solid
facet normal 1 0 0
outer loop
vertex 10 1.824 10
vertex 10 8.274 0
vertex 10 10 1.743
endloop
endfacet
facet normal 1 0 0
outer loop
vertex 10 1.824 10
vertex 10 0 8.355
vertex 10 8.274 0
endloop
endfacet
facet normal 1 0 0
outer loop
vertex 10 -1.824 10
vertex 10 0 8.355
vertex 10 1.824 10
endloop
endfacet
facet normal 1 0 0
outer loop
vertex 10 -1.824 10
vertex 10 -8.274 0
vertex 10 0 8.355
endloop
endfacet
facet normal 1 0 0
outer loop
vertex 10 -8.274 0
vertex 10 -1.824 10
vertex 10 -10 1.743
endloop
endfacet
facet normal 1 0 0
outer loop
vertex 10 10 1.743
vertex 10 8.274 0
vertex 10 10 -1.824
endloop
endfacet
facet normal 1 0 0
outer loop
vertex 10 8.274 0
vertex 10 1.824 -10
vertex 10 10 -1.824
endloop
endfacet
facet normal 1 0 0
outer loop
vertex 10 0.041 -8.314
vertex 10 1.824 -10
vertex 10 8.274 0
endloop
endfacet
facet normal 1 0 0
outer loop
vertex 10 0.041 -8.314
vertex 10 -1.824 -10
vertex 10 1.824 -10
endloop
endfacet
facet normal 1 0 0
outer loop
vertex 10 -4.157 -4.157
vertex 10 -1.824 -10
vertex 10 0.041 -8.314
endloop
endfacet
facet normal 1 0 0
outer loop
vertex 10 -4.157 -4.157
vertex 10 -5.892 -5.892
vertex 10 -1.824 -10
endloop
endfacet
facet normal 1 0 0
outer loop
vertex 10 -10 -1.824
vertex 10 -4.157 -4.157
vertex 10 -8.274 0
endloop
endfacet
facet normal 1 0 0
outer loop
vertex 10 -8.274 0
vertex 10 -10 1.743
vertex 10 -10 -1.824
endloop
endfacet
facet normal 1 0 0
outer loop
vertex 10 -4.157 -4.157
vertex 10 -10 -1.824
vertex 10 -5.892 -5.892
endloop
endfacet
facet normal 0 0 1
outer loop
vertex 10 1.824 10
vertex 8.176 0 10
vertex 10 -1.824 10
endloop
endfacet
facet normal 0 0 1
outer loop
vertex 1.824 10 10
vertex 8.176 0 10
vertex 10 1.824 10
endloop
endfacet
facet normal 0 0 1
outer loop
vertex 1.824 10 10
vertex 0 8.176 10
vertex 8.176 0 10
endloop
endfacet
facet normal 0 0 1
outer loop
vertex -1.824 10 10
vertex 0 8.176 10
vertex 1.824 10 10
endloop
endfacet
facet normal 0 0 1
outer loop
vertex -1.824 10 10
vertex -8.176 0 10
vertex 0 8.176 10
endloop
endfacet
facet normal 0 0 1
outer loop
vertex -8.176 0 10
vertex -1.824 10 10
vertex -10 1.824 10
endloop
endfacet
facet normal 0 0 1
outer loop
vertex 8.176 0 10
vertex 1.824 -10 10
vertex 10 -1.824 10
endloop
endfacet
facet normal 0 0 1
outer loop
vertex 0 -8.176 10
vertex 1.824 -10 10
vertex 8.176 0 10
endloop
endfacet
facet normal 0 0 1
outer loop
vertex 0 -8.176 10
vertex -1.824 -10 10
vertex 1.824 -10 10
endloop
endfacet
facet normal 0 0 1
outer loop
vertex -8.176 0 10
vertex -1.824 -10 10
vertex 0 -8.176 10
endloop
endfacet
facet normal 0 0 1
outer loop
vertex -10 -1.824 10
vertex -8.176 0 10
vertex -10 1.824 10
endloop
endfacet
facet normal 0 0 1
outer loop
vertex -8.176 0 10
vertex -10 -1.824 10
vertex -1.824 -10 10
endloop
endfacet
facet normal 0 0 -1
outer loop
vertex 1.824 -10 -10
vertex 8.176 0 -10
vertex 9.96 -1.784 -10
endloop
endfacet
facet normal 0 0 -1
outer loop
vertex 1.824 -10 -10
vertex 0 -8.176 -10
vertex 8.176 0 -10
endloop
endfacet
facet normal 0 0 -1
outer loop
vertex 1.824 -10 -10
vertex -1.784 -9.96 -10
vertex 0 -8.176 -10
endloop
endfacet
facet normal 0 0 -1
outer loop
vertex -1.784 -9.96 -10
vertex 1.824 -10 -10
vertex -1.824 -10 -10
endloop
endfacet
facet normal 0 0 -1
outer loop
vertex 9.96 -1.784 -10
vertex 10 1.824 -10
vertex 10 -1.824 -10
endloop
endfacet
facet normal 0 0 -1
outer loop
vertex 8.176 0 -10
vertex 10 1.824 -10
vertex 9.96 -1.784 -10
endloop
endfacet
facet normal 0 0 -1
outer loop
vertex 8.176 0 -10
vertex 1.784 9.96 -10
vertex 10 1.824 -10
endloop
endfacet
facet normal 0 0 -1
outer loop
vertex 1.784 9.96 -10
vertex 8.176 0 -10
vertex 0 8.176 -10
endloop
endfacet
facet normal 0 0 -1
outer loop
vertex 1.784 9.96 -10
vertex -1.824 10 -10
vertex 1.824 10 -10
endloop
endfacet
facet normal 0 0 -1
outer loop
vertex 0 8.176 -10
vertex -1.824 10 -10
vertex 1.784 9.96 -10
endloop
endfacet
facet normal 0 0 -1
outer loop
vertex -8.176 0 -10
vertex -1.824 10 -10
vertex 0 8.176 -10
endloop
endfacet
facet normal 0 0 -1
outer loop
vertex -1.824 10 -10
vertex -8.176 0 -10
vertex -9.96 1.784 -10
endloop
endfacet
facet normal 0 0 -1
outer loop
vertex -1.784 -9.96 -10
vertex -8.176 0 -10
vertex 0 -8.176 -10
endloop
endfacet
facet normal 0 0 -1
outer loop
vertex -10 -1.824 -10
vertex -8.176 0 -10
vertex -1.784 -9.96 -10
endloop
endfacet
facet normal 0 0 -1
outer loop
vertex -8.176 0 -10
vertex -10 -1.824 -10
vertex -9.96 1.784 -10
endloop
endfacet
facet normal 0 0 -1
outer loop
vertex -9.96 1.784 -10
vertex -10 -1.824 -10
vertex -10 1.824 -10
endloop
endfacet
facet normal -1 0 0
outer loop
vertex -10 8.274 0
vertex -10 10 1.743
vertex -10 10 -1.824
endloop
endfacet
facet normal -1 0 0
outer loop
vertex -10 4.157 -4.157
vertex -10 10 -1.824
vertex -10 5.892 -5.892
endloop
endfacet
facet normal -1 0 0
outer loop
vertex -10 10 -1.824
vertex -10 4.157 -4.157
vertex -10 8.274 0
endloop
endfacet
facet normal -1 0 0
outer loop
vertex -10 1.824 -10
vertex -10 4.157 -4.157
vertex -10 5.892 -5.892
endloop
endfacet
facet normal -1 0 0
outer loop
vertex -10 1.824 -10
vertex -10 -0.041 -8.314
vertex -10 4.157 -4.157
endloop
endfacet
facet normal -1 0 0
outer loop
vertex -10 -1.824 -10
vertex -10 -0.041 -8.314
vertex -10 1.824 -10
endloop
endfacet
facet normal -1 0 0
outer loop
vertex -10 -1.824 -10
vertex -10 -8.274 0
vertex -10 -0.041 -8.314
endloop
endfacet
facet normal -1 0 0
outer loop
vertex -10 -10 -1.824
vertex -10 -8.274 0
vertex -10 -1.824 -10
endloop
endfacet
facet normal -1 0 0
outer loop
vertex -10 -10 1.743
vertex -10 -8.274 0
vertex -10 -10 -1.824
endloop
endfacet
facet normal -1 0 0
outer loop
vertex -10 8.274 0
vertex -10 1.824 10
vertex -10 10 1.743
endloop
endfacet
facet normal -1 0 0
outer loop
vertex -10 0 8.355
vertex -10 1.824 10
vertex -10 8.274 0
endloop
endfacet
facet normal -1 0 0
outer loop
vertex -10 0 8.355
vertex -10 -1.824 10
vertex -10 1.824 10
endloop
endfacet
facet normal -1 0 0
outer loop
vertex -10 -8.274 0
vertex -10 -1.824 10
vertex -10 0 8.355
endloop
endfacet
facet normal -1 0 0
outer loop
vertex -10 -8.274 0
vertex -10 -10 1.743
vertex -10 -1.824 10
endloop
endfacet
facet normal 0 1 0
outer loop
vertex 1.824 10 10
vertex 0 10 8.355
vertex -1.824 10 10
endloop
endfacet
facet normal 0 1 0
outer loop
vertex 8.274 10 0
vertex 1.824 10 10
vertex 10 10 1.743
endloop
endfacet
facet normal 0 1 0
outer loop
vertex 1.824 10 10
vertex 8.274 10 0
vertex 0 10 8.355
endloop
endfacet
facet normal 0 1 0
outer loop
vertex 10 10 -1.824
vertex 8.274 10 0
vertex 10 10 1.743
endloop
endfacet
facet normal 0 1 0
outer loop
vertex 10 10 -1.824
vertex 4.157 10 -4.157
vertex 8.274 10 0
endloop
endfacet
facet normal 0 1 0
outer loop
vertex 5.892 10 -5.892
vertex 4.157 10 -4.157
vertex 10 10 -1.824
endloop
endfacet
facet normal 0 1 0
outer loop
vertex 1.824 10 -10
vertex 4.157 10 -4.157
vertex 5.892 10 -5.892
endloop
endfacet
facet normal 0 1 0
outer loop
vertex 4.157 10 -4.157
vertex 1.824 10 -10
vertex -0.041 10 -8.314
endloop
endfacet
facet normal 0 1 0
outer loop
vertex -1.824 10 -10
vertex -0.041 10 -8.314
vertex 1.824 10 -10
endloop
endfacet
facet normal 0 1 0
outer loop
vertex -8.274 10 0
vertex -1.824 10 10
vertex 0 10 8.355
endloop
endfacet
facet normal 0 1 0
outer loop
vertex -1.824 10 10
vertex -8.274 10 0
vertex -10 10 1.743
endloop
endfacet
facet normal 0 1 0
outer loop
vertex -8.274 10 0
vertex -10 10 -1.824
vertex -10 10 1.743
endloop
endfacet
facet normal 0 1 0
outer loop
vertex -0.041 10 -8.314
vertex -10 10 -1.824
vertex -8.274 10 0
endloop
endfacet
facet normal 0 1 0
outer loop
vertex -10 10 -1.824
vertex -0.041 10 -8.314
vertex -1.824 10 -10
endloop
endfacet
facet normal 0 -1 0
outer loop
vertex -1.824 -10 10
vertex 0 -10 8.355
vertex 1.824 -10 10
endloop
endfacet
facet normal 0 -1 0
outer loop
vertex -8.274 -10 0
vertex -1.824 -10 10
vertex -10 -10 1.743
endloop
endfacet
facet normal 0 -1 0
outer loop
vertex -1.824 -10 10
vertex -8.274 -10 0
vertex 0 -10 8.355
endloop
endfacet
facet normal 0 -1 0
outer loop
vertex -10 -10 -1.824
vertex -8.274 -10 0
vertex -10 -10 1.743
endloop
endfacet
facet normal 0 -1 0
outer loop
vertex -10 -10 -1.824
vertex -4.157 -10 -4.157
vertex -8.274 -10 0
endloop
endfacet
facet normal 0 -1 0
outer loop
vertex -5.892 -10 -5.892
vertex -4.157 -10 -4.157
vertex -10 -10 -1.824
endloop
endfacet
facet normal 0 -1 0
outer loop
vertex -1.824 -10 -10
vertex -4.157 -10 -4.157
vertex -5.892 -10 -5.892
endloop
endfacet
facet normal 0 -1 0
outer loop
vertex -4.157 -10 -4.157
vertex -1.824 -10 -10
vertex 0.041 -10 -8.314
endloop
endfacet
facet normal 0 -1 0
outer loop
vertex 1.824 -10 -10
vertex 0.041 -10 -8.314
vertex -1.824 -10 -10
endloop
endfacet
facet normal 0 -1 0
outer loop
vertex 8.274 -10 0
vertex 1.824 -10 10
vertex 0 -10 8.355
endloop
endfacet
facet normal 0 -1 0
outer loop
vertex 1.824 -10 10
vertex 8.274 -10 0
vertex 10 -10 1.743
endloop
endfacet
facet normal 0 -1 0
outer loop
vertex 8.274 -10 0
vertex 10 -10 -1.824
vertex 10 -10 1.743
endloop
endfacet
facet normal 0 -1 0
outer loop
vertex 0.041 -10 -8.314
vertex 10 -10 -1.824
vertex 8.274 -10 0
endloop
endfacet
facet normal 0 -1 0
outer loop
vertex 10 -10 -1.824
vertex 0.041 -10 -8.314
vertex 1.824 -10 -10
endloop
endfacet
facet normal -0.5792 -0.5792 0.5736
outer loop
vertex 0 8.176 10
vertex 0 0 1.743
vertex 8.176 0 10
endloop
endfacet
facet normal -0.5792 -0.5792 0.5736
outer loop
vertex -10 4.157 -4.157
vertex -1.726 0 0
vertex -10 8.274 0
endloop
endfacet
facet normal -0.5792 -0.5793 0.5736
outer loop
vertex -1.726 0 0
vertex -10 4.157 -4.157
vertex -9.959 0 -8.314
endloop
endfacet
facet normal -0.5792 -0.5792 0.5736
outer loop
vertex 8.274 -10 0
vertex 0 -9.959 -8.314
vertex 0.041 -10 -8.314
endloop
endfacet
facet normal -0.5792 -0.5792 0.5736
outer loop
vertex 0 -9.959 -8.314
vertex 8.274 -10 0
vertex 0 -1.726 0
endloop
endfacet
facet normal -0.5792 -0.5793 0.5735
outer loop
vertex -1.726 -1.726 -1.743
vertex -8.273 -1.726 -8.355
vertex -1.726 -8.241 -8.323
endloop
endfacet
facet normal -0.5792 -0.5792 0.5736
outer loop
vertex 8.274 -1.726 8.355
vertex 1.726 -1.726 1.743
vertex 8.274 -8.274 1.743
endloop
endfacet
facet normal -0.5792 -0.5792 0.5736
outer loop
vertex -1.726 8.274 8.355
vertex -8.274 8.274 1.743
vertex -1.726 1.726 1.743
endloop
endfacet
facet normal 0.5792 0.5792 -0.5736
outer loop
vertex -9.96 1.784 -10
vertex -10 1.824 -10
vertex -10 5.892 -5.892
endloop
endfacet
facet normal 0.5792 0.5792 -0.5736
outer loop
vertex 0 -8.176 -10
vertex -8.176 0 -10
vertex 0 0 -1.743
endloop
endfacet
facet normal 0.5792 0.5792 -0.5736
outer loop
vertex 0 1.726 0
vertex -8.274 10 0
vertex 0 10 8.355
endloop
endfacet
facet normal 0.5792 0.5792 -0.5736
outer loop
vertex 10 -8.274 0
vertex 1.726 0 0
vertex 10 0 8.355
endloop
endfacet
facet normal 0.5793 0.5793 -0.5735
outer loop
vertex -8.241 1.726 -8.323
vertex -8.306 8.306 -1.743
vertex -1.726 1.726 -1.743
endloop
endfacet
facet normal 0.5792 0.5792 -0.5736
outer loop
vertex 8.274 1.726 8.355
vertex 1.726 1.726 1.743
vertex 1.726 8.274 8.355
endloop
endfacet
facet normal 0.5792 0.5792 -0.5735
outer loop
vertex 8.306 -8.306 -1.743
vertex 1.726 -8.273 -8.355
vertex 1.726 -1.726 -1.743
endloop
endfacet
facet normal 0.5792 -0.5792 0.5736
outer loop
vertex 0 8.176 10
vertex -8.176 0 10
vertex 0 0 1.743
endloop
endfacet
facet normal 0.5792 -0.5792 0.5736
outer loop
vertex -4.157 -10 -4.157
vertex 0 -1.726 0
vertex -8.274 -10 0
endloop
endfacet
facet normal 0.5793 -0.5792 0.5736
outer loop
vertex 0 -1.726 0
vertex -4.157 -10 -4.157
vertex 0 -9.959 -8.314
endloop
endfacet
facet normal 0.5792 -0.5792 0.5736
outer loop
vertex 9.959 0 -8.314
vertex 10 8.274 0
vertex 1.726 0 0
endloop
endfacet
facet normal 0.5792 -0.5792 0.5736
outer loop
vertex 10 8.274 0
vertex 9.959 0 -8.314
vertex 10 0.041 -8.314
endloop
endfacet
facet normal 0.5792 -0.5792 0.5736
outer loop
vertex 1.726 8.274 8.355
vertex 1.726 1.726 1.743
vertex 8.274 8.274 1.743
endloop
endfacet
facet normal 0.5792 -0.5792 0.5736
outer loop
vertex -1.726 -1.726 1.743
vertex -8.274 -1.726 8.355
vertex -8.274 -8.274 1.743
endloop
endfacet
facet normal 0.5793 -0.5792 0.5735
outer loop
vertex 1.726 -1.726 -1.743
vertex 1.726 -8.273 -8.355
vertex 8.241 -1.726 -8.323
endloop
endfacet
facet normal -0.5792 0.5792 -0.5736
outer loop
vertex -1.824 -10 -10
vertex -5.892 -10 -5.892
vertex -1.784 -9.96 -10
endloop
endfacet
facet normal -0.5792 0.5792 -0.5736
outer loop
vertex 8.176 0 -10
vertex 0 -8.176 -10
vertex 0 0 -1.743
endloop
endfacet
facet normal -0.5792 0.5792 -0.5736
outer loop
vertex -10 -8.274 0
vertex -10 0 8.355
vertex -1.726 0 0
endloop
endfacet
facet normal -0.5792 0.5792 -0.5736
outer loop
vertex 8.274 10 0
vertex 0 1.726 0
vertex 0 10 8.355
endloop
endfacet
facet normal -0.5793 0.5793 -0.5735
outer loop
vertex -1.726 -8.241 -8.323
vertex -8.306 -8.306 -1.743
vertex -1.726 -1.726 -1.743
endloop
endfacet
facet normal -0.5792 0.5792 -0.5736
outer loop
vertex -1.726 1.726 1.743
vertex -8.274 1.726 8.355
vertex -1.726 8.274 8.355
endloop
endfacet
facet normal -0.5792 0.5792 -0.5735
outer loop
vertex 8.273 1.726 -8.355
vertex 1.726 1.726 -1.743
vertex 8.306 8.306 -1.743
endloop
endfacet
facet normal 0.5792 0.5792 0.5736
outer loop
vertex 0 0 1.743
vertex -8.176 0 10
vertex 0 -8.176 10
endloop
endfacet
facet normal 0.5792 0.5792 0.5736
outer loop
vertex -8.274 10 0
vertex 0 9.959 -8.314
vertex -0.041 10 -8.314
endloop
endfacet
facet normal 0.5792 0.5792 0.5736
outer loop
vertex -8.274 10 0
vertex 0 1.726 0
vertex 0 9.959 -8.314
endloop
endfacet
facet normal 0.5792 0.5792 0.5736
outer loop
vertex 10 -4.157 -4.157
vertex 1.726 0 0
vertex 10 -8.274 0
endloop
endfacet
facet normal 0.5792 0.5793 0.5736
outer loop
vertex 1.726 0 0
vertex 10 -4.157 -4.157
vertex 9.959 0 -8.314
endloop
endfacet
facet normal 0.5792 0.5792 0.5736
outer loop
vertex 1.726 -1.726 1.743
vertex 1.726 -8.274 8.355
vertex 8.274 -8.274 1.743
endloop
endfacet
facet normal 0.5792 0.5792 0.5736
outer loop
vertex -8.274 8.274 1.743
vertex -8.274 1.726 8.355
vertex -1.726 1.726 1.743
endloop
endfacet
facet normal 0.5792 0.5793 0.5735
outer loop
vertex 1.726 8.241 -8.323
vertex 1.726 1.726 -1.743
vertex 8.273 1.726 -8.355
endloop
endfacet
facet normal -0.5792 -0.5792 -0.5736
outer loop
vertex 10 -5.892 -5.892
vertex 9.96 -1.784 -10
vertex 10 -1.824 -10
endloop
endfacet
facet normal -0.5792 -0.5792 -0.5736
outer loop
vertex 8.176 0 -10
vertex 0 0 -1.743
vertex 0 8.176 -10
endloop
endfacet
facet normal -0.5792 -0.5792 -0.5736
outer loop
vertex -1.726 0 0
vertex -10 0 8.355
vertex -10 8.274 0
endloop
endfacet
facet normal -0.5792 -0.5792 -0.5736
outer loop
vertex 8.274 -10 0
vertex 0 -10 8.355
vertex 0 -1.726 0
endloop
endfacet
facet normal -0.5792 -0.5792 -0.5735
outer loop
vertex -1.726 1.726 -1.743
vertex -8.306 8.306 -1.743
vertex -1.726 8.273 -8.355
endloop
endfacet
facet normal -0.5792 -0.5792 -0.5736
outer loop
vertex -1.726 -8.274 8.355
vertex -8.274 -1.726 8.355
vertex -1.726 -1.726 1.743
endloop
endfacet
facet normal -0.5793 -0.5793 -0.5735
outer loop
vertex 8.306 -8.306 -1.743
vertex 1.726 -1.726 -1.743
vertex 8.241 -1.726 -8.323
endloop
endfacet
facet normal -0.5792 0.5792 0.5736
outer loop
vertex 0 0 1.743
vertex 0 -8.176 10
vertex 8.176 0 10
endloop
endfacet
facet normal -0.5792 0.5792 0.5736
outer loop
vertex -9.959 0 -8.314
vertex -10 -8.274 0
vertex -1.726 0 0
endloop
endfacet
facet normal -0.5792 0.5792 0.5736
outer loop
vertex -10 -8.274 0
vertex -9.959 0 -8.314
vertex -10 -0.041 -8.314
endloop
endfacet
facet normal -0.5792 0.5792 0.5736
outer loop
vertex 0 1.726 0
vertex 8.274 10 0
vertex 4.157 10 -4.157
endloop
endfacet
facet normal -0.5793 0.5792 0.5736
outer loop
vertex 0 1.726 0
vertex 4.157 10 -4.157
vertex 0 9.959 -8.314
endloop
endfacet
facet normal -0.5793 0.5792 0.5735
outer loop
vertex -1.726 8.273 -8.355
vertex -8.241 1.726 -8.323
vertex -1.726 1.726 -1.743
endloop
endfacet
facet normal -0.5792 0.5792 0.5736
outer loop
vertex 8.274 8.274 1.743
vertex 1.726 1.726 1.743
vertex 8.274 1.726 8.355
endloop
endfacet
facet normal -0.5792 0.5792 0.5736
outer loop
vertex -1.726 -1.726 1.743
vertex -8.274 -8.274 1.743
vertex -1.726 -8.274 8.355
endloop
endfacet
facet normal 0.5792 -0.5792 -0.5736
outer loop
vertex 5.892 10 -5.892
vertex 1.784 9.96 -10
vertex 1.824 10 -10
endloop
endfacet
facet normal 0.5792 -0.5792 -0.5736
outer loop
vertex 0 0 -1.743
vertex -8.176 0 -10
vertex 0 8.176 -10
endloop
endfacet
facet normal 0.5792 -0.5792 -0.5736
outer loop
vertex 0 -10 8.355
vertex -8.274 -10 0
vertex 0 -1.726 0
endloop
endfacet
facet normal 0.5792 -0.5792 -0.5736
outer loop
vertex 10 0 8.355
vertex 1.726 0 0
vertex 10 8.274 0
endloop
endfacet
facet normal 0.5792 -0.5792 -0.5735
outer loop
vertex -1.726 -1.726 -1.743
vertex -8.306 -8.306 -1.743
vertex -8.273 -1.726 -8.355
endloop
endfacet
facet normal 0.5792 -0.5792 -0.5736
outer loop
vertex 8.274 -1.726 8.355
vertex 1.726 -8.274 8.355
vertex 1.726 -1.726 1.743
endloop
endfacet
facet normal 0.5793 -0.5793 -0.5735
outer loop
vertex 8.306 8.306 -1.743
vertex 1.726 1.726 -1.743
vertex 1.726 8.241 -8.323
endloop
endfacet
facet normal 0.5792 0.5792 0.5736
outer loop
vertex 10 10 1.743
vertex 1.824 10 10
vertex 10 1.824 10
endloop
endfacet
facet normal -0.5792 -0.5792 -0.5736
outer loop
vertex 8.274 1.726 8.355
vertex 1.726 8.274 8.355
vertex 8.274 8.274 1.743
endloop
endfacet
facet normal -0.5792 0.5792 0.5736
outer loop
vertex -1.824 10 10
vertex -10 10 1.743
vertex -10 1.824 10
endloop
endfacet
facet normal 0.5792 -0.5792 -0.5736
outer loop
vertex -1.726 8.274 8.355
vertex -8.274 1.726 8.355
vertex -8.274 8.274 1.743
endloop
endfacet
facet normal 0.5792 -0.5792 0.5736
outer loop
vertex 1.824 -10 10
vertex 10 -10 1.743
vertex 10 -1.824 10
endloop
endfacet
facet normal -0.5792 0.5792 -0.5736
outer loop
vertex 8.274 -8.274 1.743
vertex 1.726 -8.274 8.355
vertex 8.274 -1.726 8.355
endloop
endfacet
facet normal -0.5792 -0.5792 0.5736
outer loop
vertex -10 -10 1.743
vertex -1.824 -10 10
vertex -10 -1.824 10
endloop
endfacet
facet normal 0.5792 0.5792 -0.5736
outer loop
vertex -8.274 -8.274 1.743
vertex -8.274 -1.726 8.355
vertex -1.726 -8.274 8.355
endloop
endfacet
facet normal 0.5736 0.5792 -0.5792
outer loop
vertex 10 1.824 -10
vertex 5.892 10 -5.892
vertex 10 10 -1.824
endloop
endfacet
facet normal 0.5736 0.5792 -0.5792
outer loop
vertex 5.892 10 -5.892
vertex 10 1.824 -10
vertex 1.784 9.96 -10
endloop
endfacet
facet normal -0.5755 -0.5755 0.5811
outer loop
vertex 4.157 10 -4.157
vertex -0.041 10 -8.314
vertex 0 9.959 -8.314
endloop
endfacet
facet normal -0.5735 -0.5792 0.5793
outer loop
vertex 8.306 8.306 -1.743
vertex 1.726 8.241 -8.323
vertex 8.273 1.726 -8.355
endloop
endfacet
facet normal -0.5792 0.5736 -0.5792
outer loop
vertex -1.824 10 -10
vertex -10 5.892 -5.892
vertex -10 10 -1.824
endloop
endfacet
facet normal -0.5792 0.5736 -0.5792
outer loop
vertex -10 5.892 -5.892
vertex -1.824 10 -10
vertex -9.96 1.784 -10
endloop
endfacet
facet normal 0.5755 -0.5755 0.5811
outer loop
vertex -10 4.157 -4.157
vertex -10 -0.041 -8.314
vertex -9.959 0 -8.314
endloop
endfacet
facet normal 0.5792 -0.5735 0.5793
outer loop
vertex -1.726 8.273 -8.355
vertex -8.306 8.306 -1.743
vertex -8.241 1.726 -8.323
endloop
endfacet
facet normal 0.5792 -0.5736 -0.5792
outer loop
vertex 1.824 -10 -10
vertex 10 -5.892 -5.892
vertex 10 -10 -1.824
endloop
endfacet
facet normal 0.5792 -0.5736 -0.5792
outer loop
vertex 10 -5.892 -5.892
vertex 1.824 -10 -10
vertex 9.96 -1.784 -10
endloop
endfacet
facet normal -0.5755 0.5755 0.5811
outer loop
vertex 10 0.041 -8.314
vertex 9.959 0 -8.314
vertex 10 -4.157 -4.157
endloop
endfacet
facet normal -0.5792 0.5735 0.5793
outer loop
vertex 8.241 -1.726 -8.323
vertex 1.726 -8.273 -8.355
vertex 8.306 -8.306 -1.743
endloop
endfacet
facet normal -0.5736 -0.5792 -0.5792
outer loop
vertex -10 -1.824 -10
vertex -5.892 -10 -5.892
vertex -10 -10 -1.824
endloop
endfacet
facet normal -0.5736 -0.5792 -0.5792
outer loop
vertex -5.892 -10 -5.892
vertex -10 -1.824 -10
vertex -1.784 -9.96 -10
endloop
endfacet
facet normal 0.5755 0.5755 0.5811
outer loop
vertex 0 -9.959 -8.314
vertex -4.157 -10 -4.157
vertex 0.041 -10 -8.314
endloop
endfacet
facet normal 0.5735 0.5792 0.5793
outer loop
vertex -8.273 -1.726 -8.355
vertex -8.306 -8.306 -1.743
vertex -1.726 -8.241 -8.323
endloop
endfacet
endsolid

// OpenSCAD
generate="FCC";
cube_size=20; 
thickness_of_plate=2;

module plate(XRotate,YRotate,Cube,plate_width){
    intersection(){
        rotate([XRotate,YRotate,0]) cube([(2.5*Cube),(2.5*Cube),plate_width],center=true);
        cube(Cube,center=true);
    }
}

//Body Centered Cubic
module BCC(cube_size,thickness_of_plate){
plate(45,0,cube_size,thickness_of_plate);
plate(-45,0,cube_size,thickness_of_plate);
plate(45,90,cube_size,thickness_of_plate);
plate(-45,90,cube_size,thickness_of_plate);
plate(0,45,cube_size,thickness_of_plate);
plate(0,-45,cube_size,thickness_of_plate);
}

//Simple Cubic
module SC(cube_size,thickness_of_plate){
plate(0,0,cube_size,thickness_of_plate);
plate(0,90,cube_size,thickness_of_plate);
plate(90,90,cube_size,thickness_of_plate);
}

//Face Centered Cubic
module FCC(cube_size,thickness_of_plate){
    module HexPlate(cube_size,thickness_of_plate,ZRotate){
        intersection(){
        cube(cube_size,center=true);
        rotate([0,-55,ZRotate]) cube([cube_size*sqrt(2),cube_size*sqrt(2),thickness_of_plate],center=true);
        }
    }
    module TrianglePlate(cube_size,thickness_of_plate){
        intersection(){
        cube(cube_size,center=true);
        translate([cube_size/2,cube_size/2,0]) rotate([55,0,135]) cube([2*cube_size*sqrt(2),2*cube_size*sqrt(2),thickness_of_plate],center=true);
        }
    }
    module Complete(cube_size,thickness_of_plate){
    union(){
    //HEXAGONAL PLATES
    HexPlate(cube_size,thickness_of_plate,45);
    HexPlate(cube_size,thickness_of_plate,135);
    HexPlate(cube_size,thickness_of_plate,225);
    HexPlate(cube_size,thickness_of_plate,315);
    //TRIANGULAR PLATES
    TrianglePlate(cube_size,thickness_of_plate);
    rotate([0,0,90]) TrianglePlate(cube_size,thickness_of_plate);
    rotate([0,0,-90]) TrianglePlate(cube_size,thickness_of_plate);
    rotate([0,0,-180]) TrianglePlate(cube_size,thickness_of_plate);
    rotate([0,90,0]) TrianglePlate(cube_size,thickness_of_plate);
    rotate([0,90,90]) TrianglePlate(cube_size,thickness_of_plate);
    rotate([0,90,-90]) TrianglePlate(cube_size,thickness_of_plate);
    rotate([0,90,-180]) TrianglePlate(cube_size,thickness_of_plate);
    }
    }
    Complete(cube_size,thickness_of_plate);
}

module SC_BCC(cube_size,thickness_of_plate){
BCC(cube_size,thickness_of_plate);
SC(cube_size,thickness_of_plate);
}

module SC_FCC(cube_size,thickness_of_plate){
SC(cube_size,thickness_of_plate);
FCC(cube_size,thickness_of_plate);
}

module SC_BCC_FCC(cube_size,thickness_of_plate){
SC(cube_size,thickness_of_plate);
BCC(cube_size,thickness_of_plate);
FCC(cube_size,thickness_of_plate);
}

//SC BCC Frag produces the fragmented structure of SC-BCC which is compatible with SC
module SC_BCC_frag(cube_size,thickness_of_plate){
difference(){
   BCC(cube_size,thickness_of_plate);
   SC(cube_size,thickness_of_plate);
}
}

//BCC_SC Frag produces fragmented structures of SC-BCC which is compatible with BCC
module BCC_SC_frag(cube_size,thickness_of_plate){
difference(){
    SC(cube_size,thickness_of_plate);
    BCC(cube_size,thickness_of_plate);
}
}

///FCC_SC Frag produces fragmented structures of SC-FCC which is compatible with FCC
module FCC_SC_frag(cube_size,thickness_of_plate){
difference(){
    SC(cube_size,thickness_of_plate);
    FCC(cube_size,thickness_of_plate);
}
}

//SC_FCC Frag produces the fragmented structure of SC-FCC which is compatible with SC
module SC_FCC_frag(cube_size,thickness_of_plate){
difference(){
    FCC(cube_size,thickness_of_plate);
    SC(cube_size,thickness_of_plate);
}
}

if (generate=="BCC") BCC(cube_size,thickness_of_plate);
if (generate=="SC") SC(cube_size,thickness_of_plate);
if (generate=="FCC") FCC(cube_size,thickness_of_plate);
if (generate=="SC-BCC") SC_BCC(cube_size,thickness_of_plate);
if (generate=="SC-FCC") SC_FCC(cube_size,thickness_of_plate);
if (generate=="SC-BCC-FCC") SC_BCC_FCC(cube_size,thickness_of_plate);
if (generate=="SC-BCC(frag)") SC_BCC_frag(cube_size,thickness_of_plate);
if (generate=="BCC-SC(frag)") BCC_SC_frag(cube_size,thickness_of_plate);
if (generate=="FCC-SC(frag)") FCC_SC_frag(cube_size,thickness_of_plate);
if (generate=="SC-FCC(frag)") SC_FCC_frag(cube_size,thickness_of_plate);
